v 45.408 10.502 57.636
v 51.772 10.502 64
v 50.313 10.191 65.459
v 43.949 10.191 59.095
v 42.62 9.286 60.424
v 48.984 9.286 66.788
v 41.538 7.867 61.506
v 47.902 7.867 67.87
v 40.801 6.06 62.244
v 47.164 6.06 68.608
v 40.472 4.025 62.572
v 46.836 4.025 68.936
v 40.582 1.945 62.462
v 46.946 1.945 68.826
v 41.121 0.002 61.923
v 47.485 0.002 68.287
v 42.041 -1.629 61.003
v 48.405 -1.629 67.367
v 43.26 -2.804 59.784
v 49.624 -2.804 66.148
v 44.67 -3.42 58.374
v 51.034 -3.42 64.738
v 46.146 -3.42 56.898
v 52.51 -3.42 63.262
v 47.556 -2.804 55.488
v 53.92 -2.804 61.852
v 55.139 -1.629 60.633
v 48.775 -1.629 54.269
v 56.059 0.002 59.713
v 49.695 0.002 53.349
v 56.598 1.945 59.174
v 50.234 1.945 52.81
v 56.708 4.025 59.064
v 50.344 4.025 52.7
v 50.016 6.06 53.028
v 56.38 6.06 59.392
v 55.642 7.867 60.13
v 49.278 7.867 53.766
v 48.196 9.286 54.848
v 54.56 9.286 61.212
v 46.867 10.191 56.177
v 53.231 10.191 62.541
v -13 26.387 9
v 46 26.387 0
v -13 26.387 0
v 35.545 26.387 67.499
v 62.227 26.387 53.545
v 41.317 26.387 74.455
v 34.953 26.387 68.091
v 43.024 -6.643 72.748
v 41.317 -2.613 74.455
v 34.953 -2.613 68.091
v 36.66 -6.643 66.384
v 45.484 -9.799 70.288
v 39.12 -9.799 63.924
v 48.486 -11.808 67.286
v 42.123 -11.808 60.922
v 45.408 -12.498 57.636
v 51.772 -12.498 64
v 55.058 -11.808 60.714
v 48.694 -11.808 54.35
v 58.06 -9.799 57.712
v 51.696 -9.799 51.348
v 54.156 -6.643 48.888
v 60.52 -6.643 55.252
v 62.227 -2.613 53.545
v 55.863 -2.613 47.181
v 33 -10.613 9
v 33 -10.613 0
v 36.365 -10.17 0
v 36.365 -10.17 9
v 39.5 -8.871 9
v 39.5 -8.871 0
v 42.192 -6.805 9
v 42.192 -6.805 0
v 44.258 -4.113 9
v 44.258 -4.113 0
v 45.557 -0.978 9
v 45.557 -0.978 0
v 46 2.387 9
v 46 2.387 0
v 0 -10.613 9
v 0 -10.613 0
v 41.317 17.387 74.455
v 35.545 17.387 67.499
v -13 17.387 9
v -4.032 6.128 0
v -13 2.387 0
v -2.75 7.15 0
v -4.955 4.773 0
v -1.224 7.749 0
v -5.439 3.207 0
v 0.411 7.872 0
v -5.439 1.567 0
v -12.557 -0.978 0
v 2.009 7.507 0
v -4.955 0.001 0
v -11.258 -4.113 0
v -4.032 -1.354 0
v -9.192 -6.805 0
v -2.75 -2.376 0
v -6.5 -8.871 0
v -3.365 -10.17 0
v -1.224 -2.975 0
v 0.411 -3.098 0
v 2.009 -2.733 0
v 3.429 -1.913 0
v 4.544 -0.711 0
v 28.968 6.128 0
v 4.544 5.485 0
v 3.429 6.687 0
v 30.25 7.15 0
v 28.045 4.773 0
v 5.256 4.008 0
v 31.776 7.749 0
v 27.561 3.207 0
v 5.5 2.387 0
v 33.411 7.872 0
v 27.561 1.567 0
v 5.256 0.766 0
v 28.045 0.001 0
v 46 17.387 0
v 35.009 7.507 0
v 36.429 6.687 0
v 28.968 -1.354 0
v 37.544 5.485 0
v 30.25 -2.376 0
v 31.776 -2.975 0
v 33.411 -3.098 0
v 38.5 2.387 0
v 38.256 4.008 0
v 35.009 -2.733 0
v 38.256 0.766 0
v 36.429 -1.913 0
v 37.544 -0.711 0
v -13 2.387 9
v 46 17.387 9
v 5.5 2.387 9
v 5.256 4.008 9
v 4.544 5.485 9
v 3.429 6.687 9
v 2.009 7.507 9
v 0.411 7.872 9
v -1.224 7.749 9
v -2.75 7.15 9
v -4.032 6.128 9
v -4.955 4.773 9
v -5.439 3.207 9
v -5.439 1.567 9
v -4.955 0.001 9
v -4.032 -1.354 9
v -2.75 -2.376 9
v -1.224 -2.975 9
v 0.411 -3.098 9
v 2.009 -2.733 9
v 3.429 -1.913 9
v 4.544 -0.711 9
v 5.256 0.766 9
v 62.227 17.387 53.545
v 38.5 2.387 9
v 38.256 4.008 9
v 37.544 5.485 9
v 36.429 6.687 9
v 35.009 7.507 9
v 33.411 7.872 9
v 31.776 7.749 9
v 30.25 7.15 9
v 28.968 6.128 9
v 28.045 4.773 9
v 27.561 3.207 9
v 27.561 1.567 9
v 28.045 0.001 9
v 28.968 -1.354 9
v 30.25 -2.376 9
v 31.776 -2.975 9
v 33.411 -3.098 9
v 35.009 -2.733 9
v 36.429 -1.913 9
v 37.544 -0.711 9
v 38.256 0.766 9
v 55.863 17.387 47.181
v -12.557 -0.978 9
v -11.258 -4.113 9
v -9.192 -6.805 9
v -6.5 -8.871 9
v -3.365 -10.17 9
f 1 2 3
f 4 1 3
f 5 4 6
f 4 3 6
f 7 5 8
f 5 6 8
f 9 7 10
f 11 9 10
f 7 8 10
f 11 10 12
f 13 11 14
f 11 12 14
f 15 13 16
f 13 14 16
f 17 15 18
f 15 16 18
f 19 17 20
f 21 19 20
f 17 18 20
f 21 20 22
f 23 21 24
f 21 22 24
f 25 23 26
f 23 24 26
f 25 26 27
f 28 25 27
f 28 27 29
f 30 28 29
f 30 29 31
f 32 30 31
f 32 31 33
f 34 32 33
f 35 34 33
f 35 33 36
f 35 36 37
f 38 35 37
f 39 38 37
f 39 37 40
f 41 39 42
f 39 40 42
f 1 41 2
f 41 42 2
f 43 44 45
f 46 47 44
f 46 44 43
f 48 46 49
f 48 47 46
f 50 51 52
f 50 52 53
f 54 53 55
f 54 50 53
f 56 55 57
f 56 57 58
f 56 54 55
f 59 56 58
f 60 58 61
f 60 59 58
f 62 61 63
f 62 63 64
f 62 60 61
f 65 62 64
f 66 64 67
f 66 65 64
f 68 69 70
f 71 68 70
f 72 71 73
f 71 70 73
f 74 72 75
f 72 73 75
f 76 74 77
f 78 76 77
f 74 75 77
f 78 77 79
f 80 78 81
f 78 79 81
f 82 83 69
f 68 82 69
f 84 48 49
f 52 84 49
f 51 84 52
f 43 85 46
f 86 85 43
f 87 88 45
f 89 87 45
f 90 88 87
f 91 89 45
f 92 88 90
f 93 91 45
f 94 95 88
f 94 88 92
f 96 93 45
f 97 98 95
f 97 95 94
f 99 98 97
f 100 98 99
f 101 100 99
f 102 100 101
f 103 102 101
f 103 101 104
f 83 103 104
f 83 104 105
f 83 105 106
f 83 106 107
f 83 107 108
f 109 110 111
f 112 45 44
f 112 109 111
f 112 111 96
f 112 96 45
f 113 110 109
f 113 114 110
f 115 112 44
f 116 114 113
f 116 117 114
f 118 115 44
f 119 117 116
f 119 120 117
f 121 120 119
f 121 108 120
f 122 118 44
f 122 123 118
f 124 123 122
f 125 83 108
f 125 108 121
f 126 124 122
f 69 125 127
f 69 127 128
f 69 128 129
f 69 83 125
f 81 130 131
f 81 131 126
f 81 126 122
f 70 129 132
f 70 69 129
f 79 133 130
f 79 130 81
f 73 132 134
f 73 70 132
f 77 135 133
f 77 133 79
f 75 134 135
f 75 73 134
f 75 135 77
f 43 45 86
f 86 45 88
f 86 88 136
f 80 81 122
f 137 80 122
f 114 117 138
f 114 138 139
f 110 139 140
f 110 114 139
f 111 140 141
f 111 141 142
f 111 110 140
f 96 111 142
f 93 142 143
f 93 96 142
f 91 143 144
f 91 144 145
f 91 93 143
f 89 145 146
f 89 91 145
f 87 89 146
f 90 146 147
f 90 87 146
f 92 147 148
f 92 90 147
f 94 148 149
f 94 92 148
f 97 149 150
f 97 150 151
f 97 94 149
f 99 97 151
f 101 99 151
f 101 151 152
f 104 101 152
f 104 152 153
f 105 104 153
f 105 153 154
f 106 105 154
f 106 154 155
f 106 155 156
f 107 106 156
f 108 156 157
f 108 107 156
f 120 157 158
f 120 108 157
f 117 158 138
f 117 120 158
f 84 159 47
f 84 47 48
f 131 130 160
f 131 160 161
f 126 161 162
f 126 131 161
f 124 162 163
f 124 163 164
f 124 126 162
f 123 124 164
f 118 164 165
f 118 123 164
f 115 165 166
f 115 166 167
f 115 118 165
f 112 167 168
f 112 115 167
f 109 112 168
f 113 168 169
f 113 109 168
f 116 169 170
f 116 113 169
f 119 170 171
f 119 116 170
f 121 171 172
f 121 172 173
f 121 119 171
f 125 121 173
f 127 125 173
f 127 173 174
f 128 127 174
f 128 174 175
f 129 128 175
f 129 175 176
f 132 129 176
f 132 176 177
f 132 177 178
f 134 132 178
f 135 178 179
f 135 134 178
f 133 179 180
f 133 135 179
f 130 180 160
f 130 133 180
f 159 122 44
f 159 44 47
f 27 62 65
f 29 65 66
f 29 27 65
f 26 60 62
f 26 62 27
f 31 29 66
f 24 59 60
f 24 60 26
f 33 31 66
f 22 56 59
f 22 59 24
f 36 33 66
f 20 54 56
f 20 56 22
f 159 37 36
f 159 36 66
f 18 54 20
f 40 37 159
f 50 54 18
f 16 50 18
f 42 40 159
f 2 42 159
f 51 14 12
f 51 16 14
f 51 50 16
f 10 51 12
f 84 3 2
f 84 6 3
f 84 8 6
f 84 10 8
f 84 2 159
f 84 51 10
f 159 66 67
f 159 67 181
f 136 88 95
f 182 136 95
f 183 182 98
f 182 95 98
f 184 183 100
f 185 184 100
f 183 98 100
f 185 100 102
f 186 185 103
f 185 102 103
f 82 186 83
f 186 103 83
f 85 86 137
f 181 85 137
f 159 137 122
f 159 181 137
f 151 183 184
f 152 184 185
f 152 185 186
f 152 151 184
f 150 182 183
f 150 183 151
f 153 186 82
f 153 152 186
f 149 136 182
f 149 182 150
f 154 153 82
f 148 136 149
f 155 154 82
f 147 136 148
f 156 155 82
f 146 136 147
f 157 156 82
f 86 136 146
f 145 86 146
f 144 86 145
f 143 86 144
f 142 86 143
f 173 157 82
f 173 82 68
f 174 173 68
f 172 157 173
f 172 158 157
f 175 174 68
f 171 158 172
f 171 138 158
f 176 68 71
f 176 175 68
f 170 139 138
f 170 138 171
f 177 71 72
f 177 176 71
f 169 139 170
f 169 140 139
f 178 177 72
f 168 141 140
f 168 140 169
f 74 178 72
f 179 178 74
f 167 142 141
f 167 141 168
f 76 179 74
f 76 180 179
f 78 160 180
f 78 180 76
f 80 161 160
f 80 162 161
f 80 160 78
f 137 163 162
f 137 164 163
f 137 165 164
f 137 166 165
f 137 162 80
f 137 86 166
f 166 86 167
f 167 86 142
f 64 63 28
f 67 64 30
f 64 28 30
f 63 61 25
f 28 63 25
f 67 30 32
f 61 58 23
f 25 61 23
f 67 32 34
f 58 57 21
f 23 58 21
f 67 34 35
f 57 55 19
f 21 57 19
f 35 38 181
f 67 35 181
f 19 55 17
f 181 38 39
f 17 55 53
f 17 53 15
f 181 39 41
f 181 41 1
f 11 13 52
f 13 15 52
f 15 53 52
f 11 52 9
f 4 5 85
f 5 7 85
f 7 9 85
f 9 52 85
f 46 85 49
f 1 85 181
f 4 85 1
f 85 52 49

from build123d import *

# Parameters (mm, degrees)
F0_R     = 5.5
F1_DEPTH = 9
F3_START = -17.3870930076
F2_W     = 59
F2_H     = 9
F3_DEPTH = 8.9999069924
F5_R     = 7
F6_DEPTH = 9


with BuildPart() as f1:
    # F0 (on Top) → F1 (new body)
    with BuildSketch(Plane.XY):
        with BuildLine():
            Line((46, 17.3870930076), (-13, 17.3870930076))
            Line((-13, 17.3870930076), (-13, 2.3870930076))
            ThreePointArc((-13, 2.3870930076), (-9.1923881554, -6.8052951478), (0, -10.6129069924))
            Line((0, -10.6129069924), (33, -10.6129069924))
            ThreePointArc((33, -10.6129069924), (42.1923881554, -6.8052951478), (46, 2.3870930076))
            Line((46, 2.3870930076), (46, 17.3870930076))
        make_face()
        with Locations((0, 2.3870930076)):
            Circle(F0_R, mode=Mode.SUBTRACT)
        with Locations((33, 2.3870930076)):
            Circle(F0_R, mode=Mode.SUBTRACT)
    extrude(amount=F1_DEPTH)

    # F2 (on Front) → F3 (join)
    with BuildSketch(Plane.XZ.offset(F3_START)):
        with Locations((16.5, 4.5)):
            Rectangle(F2_W, F2_H)
        Polygon((46, 9), (46, 0), (62.2267983854, 53.5452626646), (41.3173237145, 74.4547373354), (-13, 9), align=None)
    extrude(amount=-F3_DEPTH)

    # F5 (on offset) → F6 (join)
    with BuildSketch(Plane(origin=(57.886030525, 0, 57.886030525), x_dir=(0, 1, 0), z_dir=(0.7071067812, 0, 0.7071067812))):
        with BuildLine():
            Line((-2.613, -6.1387727793), (26.387, -6.1387727793))
            Line((26.387, -6.1387727793), (26.387, 23.4316898824))
            Line((26.387, 23.4316898824), (-2.613, 23.4316898824))
            ThreePointArc((-2.613, 23.4316898824), (-12.4976966965, 8.6464585515), (-2.613, -6.1387727793))
        make_face()
        with Locations((3.5023033035, 8.6464585515)):
            Circle(F5_R, mode=Mode.SUBTRACT)
    extrude(amount=-F6_DEPTH)


solid = f1.part
